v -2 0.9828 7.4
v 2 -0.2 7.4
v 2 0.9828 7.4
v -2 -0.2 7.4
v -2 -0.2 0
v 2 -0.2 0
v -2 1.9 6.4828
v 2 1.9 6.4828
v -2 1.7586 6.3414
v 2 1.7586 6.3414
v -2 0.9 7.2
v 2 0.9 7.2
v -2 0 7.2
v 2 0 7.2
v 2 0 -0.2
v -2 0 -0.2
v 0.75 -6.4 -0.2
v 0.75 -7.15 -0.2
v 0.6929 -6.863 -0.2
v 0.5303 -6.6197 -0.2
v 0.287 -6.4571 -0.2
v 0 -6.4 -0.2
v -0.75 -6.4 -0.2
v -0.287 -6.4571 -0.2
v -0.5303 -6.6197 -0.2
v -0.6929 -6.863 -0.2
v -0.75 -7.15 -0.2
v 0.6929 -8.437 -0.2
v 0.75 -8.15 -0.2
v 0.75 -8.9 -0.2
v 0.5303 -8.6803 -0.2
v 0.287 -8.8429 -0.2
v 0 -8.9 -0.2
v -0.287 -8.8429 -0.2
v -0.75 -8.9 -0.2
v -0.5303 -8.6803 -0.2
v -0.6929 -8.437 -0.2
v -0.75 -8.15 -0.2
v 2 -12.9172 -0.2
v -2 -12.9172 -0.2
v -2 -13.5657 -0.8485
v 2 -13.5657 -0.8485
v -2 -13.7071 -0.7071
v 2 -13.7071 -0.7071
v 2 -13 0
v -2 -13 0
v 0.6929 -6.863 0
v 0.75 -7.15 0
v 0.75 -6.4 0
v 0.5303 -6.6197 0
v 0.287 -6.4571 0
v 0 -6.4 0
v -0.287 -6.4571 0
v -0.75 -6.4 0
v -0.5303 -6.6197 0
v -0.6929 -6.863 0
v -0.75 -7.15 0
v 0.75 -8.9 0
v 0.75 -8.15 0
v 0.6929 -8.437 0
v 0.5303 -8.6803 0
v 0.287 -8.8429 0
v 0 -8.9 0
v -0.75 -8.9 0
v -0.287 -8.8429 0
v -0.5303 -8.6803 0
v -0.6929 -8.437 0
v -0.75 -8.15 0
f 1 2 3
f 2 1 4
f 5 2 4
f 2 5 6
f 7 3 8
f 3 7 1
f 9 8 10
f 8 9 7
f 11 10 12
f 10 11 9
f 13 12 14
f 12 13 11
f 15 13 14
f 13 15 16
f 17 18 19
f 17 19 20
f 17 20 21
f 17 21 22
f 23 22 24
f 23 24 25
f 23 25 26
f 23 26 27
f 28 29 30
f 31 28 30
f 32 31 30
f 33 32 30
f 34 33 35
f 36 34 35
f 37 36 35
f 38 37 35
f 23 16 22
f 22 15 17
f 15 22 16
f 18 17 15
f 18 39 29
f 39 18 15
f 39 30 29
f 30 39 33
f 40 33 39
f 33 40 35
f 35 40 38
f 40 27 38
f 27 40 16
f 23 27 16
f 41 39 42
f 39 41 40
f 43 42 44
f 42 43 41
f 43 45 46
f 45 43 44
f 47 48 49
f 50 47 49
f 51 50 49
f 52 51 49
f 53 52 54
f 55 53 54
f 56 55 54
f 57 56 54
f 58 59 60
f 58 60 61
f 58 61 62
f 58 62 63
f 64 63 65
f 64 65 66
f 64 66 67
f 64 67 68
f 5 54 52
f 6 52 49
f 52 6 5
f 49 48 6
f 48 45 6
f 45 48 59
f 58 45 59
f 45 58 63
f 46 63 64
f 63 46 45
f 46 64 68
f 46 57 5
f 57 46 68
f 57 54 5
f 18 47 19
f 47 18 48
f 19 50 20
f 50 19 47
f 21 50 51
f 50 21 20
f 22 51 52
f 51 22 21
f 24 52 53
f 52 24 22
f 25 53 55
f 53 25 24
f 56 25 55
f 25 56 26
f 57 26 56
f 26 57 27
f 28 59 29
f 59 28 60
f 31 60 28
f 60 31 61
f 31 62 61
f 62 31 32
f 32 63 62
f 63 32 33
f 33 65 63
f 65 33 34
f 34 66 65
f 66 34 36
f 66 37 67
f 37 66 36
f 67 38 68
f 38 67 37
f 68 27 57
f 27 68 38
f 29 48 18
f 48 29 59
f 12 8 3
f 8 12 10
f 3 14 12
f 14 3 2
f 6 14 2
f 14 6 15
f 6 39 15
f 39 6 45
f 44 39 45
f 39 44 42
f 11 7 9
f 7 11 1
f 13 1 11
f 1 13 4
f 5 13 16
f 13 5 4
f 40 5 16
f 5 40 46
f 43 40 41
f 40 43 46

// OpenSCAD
// file: ../p/2-4edge.scad
use <../lib.scad>
function ldraw_lib__2_4edge() = [
// 0 Circle 0.5
// 0 Name: 2-4edge.dat
// 0 Author: James Jessiman
// 0 !LDRAW_ORG Primitive UPDATE 2017-01
// 0 !LICENSE Licensed under CC BY 4.0 : see CAreadme.txt
// 
// 0 BFC CERTIFY CCW
  [0,"BFC","CERTIFY"],
  [0,"BFC","CCW"],
// 
// 0 !HISTORY 2007-06-24 [PTadmin] Header formatted for Contributor Agreement
// 0 !HISTORY 2008-07-01 [PTadmin] Official Update 2008-01
// 0 !HISTORY 2017-01-15 [Steffen] BFCed
// 0 !HISTORY 2017-12-30 [PTadmin] Official Update 2017-01
// 
// 
// 2 24 1 0 0 0.9239 0 0.3827
  [2,24,1,0,0,0.9239,0,0.3827],
// 2 24 0.9239 0 0.3827 0.7071 0 0.7071
  [2,24,0.9239,0,0.3827,0.7071,0,0.7071],
// 2 24 0.7071 0 0.7071 0.3827 0 0.9239
  [2,24,0.7071,0,0.7071,0.3827,0,0.9239],
// 2 24 0.3827 0 0.9239 0 0 1
  [2,24,0.3827,0,0.9239,0,0,1],
// 2 24 0 0 1 -0.3827 0 0.9239
  [2,24,0,0,1,-0.3827,0,0.9239],
// 2 24 -0.3827 0 0.9239 -0.7071 0 0.7071
  [2,24,-0.3827,0,0.9239,-0.7071,0,0.7071],
// 2 24 -0.7071 0 0.7071 -0.9239 0 0.3827
  [2,24,-0.7071,0,0.7071,-0.9239,0,0.3827],
// 2 24 -0.9239 0 0.3827 -1 0 0
  [2,24,-0.9239,0,0.3827,-1,0,0],
];
module ldraw_lib__2_4edge(step=0, col=false, unit=2/5, alt=false, line=0.2, solid=!$preview)
    makepoly(ldraw_lib__2_4edge(), step=step, col=col, unit=unit, alt=alt, line=line, solid=solid);
ldraw_lib__2_4edge(line=0.2);
// file: ../p/2-4cyli.scad
use <../lib.scad>
function ldraw_lib__2_4cyli() = [
// 0 Cylinder 0.5
// 0 Name: 2-4cyli.dat
// 0 Author: James Jessiman
// 0 !LDRAW_ORG Primitive UPDATE 2005-01
// 0 !LICENSE Licensed under CC BY 4.0 : see CAreadme.txt
// 
// 0 BFC CERTIFY CCW
  [0,"BFC","CERTIFY"],
  [0,"BFC","CCW"],
// 
// 0 !HISTORY 2002-03-23 [sbliss] Added BFC statement; compacted code
// 0 !HISTORY 2002-04-25 [PTadmin] Official Update 2002-02
// 0 !HISTORY 2004-12-11 [nielsk] Recreated using Primitive Generator, Edge lines fixed, BFC changed to CCW
// 0 !HISTORY 2005-12-28 [PTadmin] Official Update 2005-01
// 0 !HISTORY 2007-06-24 [PTadmin] Header formatted for Contributor Agreement
// 0 !HISTORY 2008-07-01 [PTadmin] Official Update 2008-01
// 
// 
// 4 16 .9239 1 .3827 .9239 0 .3827 1 0 0 1 1 0
  [4,16,.9239,1,.3827,.9239,0,.3827,1,0,0,1,1,0],
// 4 16 .7071 1 .7071 .7071 0 .7071 .9239 0 .3827 .9239 1 .3827
  [4,16,.7071,1,.7071,.7071,0,.7071,.9239,0,.3827,.9239,1,.3827],
// 4 16 .3827 1 .9239 .3827 0 .9239 .7071 0 .7071 .7071 1 .7071
  [4,16,.3827,1,.9239,.3827,0,.9239,.7071,0,.7071,.7071,1,.7071],
// 4 16 0 1 1 0 0 1 .3827 0 .9239 .3827 1 .9239
  [4,16,0,1,1,0,0,1,.3827,0,.9239,.3827,1,.9239],
// 4 16 -.3827 1 .9239 -.3827 0 .9239 0 0 1 0 1 1
  [4,16,-.3827,1,.9239,-.3827,0,.9239,0,0,1,0,1,1],
// 4 16 -.7071 1 .7071 -.7071 0 .7071 -.3827 0 .9239 -.3827 1 .9239
  [4,16,-.7071,1,.7071,-.7071,0,.7071,-.3827,0,.9239,-.3827,1,.9239],
// 4 16 -.9239 1 .3827 -.9239 0 .3827 -.7071 0 .7071 -.7071 1 .7071
  [4,16,-.9239,1,.3827,-.9239,0,.3827,-.7071,0,.7071,-.7071,1,.7071],
// 4 16 -1 1 0 -1 0 0 -.9239 0 .3827 -.9239 1 .3827
  [4,16,-1,1,0,-1,0,0,-.9239,0,.3827,-.9239,1,.3827],
// 5 24 1 1 0 1 0 0 1 1 -.4142 .9239 1 .3827
  [5,24,1,1,0,1,0,0,1,1,-.4142,.9239,1,.3827],
// 5 24 .9239 1 .3827 .9239 0 .3827 1 1 0 .7071 1 .7071
  [5,24,.9239,1,.3827,.9239,0,.3827,1,1,0,.7071,1,.7071],
// 5 24 .7071 1 .7071 .7071 0 .7071 .9239 1 .3827 .3827 1 .9239
  [5,24,.7071,1,.7071,.7071,0,.7071,.9239,1,.3827,.3827,1,.9239],
// 5 24 .3827 1 .9239 .3827 0 .9239 .7071 1 .7071 0 1 1
  [5,24,.3827,1,.9239,.3827,0,.9239,.7071,1,.7071,0,1,1],
// 5 24 0 1 1 0 0 1 .3827 1 .9239 -.3827 1 .9239
  [5,24,0,1,1,0,0,1,.3827,1,.9239,-.3827,1,.9239],
// 5 24 -.3827 1 .9239 -.3827 0 .9239 0 1 1 -.7071 1 .7071
  [5,24,-.3827,1,.9239,-.3827,0,.9239,0,1,1,-.7071,1,.7071],
// 5 24 -.7071 1 .7071 -.7071 0 .7071 -.3827 1 .9239 -.9239 1 .3827
  [5,24,-.7071,1,.7071,-.7071,0,.7071,-.3827,1,.9239,-.9239,1,.3827],
// 5 24 -.9239 1 .3827 -.9239 0 .3827 -.7071 1 .7071 -1 1 0
  [5,24,-.9239,1,.3827,-.9239,0,.3827,-.7071,1,.7071,-1,1,0],
// 5 24 -1 1 0 -1 0 0 -.9239 1 .3827 -1 1 -.4142
  [5,24,-1,1,0,-1,0,0,-.9239,1,.3827,-1,1,-.4142],
// 0
];
module ldraw_lib__2_4cyli(step=0, col=false, unit=2/5, alt=false, line=0.2, solid=!$preview)
    makepoly(ldraw_lib__2_4cyli(), step=step, col=col, unit=unit, alt=alt, line=line, solid=solid);
ldraw_lib__2_4cyli(line=0.2);
// file: ../p/recte3.scad
use <../lib.scad>
function ldraw_lib__recte3() = [
// 0 Rectangle Empty with 3 Edges
// 0 Name: recte3.dat
// 0 Author: Steffen [Steffen]
// 0 !LDRAW_ORG Primitive UPDATE 2011-01
// 0 !LICENSE Licensed under CC BY 4.0 : see CAreadme.txt
// 
// 0 BFC CERTIFY CCW
  [0,"BFC","CERTIFY"],
  [0,"BFC","CCW"],
// 
// 0 !HISTORY 2011-07-25 [PTadmin] Official Update 2011-01
// 
// 
// 2 24 1 0 1 -1 0 1
  [2,24,1,0,1,-1,0,1],
// 2 24 -1 0 1 -1 0 -1
  [2,24,-1,0,1,-1,0,-1],
// 2 24 1 0 -1 1 0 1
  [2,24,1,0,-1,1,0,1],
];
module ldraw_lib__recte3(step=0, col=false, unit=2/5, alt=false, line=0.2, solid=!$preview)
    makepoly(ldraw_lib__recte3(), step=step, col=col, unit=unit, alt=alt, line=line, solid=solid);
ldraw_lib__recte3(line=0.2);
// file: ../p/rect3.scad
use <../lib.scad>
function ldraw_lib__rect3() = [
// 0 Rectangle with 3 Edges
// 0 Name: rect3.dat
// 0 Author: Mark Kennedy [mkennedy]
// 0 !LDRAW_ORG Primitive UPDATE 2010-01
// 0 !LICENSE Licensed under CC BY 4.0 : see CAreadme.txt
// 
// 0 BFC CERTIFY CCW
  [0,"BFC","CERTIFY"],
  [0,"BFC","CCW"],
// 
// 0 !HISTORY 2003-08-01 [PTadmin] Official Update 2003-02
// 0 !HISTORY 2007-06-24 [PTadmin] Header formatted for Contributor Agreement
// 0 !HISTORY 2008-07-01 [PTadmin] Official Update 2008-01
// 0 !HISTORY 2010-01-17 [mikeheide] Change winding to CCW
// 0 !HISTORY 2010-04-05 [PTadmin] Official Update 2010-01
// 
// 
// 2 24 1 0 1 -1 0 1
  [2,24,1,0,1,-1,0,1],
// 2 24 1 0 1 1 0 -1
  [2,24,1,0,1,1,0,-1],
// 2 24 -1 0 1 -1 0 -1
  [2,24,-1,0,1,-1,0,-1],
// 4 16 -1 0 1 -1 0 -1 1 0 -1 1 0 1
  [4,16,-1,0,1,-1,0,-1,1,0,-1,1,0,1],
// 0 //
];
module ldraw_lib__rect3(step=0, col=false, unit=2/5, alt=false, line=0.2, solid=!$preview)
    makepoly(ldraw_lib__rect3(), step=step, col=col, unit=unit, alt=alt, line=line, solid=solid);
ldraw_lib__rect3(line=0.2);
// file: ../p/rect2p.scad
use <../lib.scad>
function ldraw_lib__rect2p() = [
// 0 Rectangle with 2 Parallel Edges
// 0 Name: rect2p.dat
// 0 Author: Donald Sutter [technog]
// 0 !LDRAW_ORG Primitive UPDATE 2010-01
// 0 !LICENSE Licensed under CC BY 4.0 : see CAreadme.txt
// 
// 0 BFC CERTIFY CCW
  [0,"BFC","CERTIFY"],
  [0,"BFC","CCW"],
// 
// 0 !HISTORY 2003-08-01 [PTadmin] Official Update 2003-02
// 0 !HISTORY 2007-06-24 [PTadmin] Header formatted for Contributor Agreement
// 0 !HISTORY 2008-07-01 [PTadmin] Official Update 2008-01
// 0 !HISTORY 2010-01-17 [mikeheide] changed winding to CCW
// 0 !HISTORY 2010-04-05 [PTadmin] Official Update 2010-01
// 
// 
// 2 24 1 0 1 -1 0 1
  [2,24,1,0,1,-1,0,1],
// 2 24 -1 0 -1 1 0 -1
  [2,24,-1,0,-1,1,0,-1],
// 4 16 -1 0 1 -1 0 -1 1 0 -1 1 0 1
  [4,16,-1,0,1,-1,0,-1,1,0,-1,1,0,1],
// 0
];
module ldraw_lib__rect2p(step=0, col=false, unit=2/5, alt=false, line=0.2, solid=!$preview)
    makepoly(ldraw_lib__rect2p(), step=step, col=col, unit=unit, alt=alt, line=line, solid=solid);
ldraw_lib__rect2p(line=0.2);
// file: ../p/box2-5.scad
use <../lib.scad>
function ldraw_lib__box2_5() = [
// 0 Box with 2 Faces without 5 Edges
// 0 Name: box2-5.dat
// 0 Author: Steffen [Steffen]
// 0 !LDRAW_ORG Primitive UPDATE 2003-03
// 0 !LICENSE Licensed under CC BY 4.0 : see CAreadme.txt
// 
// 0 BFC CERTIFY CCW
  [0,"BFC","CERTIFY"],
  [0,"BFC","CCW"],
// 
// 0 !HISTORY 2003-12-19 [PTadmin] Official Update 2003-03
// 0 !HISTORY 2007-06-24 [PTadmin] Header formatted for Contributor Agreement
// 0 !HISTORY 2008-07-01 [PTadmin] Official Update 2008-01
// 
// 
// 2 24 1 1 1 -1 1 1
  [2,24,1,1,1,-1,1,1],
// 2 24 1 1 -1 -1 1 -1
  [2,24,1,1,-1,-1,1,-1],
// 2 24 1 -1 1 -1 -1 1
  [2,24,1,-1,1,-1,-1,1],
// 2 24 -1 -1 1 -1 1 1
  [2,24,-1,-1,1,-1,1,1],
// 2 24 1 -1 1 1 1 1
  [2,24,1,-1,1,1,1,1],
// 2 24 -1 1 -1 -1 1 1
  [2,24,-1,1,-1,-1,1,1],
// 2 24 1 1 -1 1 1 1
  [2,24,1,1,-1,1,1,1],
// 4 16 1 1 1 1 1 -1 -1 1 -1 -1 1 1
  [4,16,1,1,1,1,1,-1,-1,1,-1,-1,1,1],
// 4 16 1 1 1 -1 1 1 -1 -1 1 1 -1 1
  [4,16,1,1,1,-1,1,1,-1,-1,1,1,-1,1],
// 0
];
module ldraw_lib__box2_5(step=0, col=false, unit=2/5, alt=false, line=0.2, solid=!$preview)
    makepoly(ldraw_lib__box2_5(), step=step, col=col, unit=unit, alt=alt, line=line, solid=solid);
ldraw_lib__box2_5(line=0.2);
// file: ../p/2-4ndis.scad
use <../lib.scad>
function ldraw_lib__2_4ndis() = [
// 0 Disc Negative 0.5
// 0 Name: 2-4ndis.dat
// 0 Author: James Jessiman
// 0 !LDRAW_ORG Primitive UPDATE 2012-01
// 0 !LICENSE Licensed under CC BY 4.0 : see CAreadme.txt
// 
// 0 BFC CERTIFY CCW
  [0,"BFC","CERTIFY"],
  [0,"BFC","CCW"],
// 
// 0 !HISTORY 2002-03-23 [sbliss] Added BFC statement; compacted code
// 0 !HISTORY 2002-04-25 [PTadmin] Official Update 2002-02
// 0 !HISTORY 2007-06-24 [PTadmin] Header formatted for Contributor Agreement
// 0 !HISTORY 2008-07-01 [PTadmin] Official Update 2008-01
// 0 !HISTORY 2012-02-16 [Philo] Changed to CCW
// 0 !HISTORY 2012-03-30 [PTadmin] Official Update 2012-01
// 
// 
// 3 16 0.9239 0 0.3827 1 0 0 1 0 1
  [3,16,0.9239,0,0.3827,1,0,0,1,0,1],
// 3 16 0.7071 0 0.7071 0.9239 0 0.3827 1 0 1
  [3,16,0.7071,0,0.7071,0.9239,0,0.3827,1,0,1],
// 3 16 0.3827 0 0.9239 0.7071 0 0.7071 1 0 1
  [3,16,0.3827,0,0.9239,0.7071,0,0.7071,1,0,1],
// 3 16 0 0 1 0.3827 0 0.9239 1 0 1
  [3,16,0,0,1,0.3827,0,0.9239,1,0,1],
// 3 16 -0.3827 0 0.9239 0 0 1 -1 0 1
  [3,16,-0.3827,0,0.9239,0,0,1,-1,0,1],
// 3 16 -0.7071 0 0.7071 -0.3827 0 0.9239 -1 0 1
  [3,16,-0.7071,0,0.7071,-0.3827,0,0.9239,-1,0,1],
// 3 16 -0.9239 0 0.3827 -0.7071 0 0.7071 -1 0 1
  [3,16,-0.9239,0,0.3827,-0.7071,0,0.7071,-1,0,1],
// 3 16 -1 0 0 -0.9239 0 0.3827 -1 0 1
  [3,16,-1,0,0,-0.9239,0,0.3827,-1,0,1],
];
module ldraw_lib__2_4ndis(step=0, col=false, unit=2/5, alt=false, line=0.2, solid=!$preview)
    makepoly(ldraw_lib__2_4ndis(), step=step, col=col, unit=unit, alt=alt, line=line, solid=solid);
ldraw_lib__2_4ndis(line=0.2);
// file: ../p/2-4cylo.scad
use <../lib.scad>
use <2-4cyli.scad>
use <2-4edge.scad>
function ldraw_lib__2_4cylo() = [
// 0 Cylinder Open 0.5
// 0 Name: 2-4cylo.dat
// 0 Author: Max Martin Richter [MMR1988]
// 0 !LDRAW_ORG Primitive UPDATE 2010-03
// 0 !LICENSE Licensed under CC BY 4.0 : see CAreadme.txt
// 
// 0 BFC CERTIFY CCW
  [0,"BFC","CERTIFY"],
  [0,"BFC","CCW"],
// 
// 0 !HISTORY 2010-12-31 [PTadmin] Official Update 2010-03
// 
// 
// 1 16 0 0 0 1 0 0 0 1 0 0 0 1 2-4edge.dat
  [1,16,0,0,0,1,0,0,0,1,0,0,0,1, ldraw_lib__2_4edge()],
// 1 16 0 1 0 1 0 0 0 1 0 0 0 1 2-4edge.dat
  [1,16,0,1,0,1,0,0,0,1,0,0,0,1, ldraw_lib__2_4edge()],
// 1 16 0 0 0 1 0 0 0 1 0 0 0 1 2-4cyli.dat
  [1,16,0,0,0,1,0,0,0,1,0,0,0,1, ldraw_lib__2_4cyli()],
];
module ldraw_lib__2_4cylo(step=0, col=false, unit=2/5, alt=false, line=0.2, solid=!$preview)
    makepoly(ldraw_lib__2_4cylo(), step=step, col=col, unit=unit, alt=alt, line=line, solid=solid);
ldraw_lib__2_4cylo(line=0.2);
// main file
use <../lib.scad>
use <../p/2-4cylo.scad>
use <../p/2-4ndis.scad>
use <../p/box2-5.scad>
use <../p/rect2p.scad>
use <../p/rect3.scad>
use <../p/recte3.scad>
function ldraw_lib__u9173() = [
// 0 ~Train Track  9V Switch - Internal Contact Plate for Switch Function
// 0 Name: u9173.dat
// 0 Author: Max Martin Richter [MMR1988]
// 0 !LDRAW_ORG Part UPDATE 2025-08
// 0 !LICENSE Licensed under CC BY 4.0 : see CAreadme.txt
// 
// 0 BFC CERTIFY CCW
  [0,"BFC","CERTIFY"],
  [0,"BFC","CCW"],
// 
// 0 !HISTORY 2025-08-31 [OrionP] Official Update 2025-08
// 
// 1 16 0 -9.25 .978553 5 0 0 0 -9.25 0 0 0 -1.478553 box2-5.dat
  [1,16,0,-9.25,.978553,5,0,0,0,-9.25,0,0,0,-1.478553, ldraw_lib__box2_5()],
// 4 16 5 -16.207107 4.75 -5 -16.207107 4.75 -5 -18.5 2.457106 5 -18.5 2.457106
  [4,16,5,-16.207107,4.75,-5,-16.207107,4.75,-5,-18.5,2.457106,5,-18.5,2.457106],
// 2 24 -5 -16.207107 4.75 -5 -18.5 2.457106
  [2,24,-5,-16.207107,4.75,-5,-18.5,2.457106],
// 2 24 5 -16.207107 4.75 5 -18.5 2.457106
  [2,24,5,-16.207107,4.75,5,-18.5,2.457106],
// 2 24 -5 -16.207107 4.75 5 -16.207107 4.75
  [2,24,-5,-16.207107,4.75,5,-16.207107,4.75],
// 4 16 -5 -16.207107 4.75 5 -16.207107 4.75 5 -15.853554 4.396446 -5 -15.853554 4.396446
  [4,16,-5,-16.207107,4.75,5,-16.207107,4.75,5,-15.853554,4.396446,-5,-15.853554,4.396446],
// 2 24 -5 -15.853554 4.396446 -5 -16.207107 4.75
  [2,24,-5,-15.853554,4.396446,-5,-16.207107,4.75],
// 2 24 5 -15.853554 4.396446 5 -16.207107 4.75
  [2,24,5,-15.853554,4.396446,5,-16.207107,4.75],
// 1 16 0 -16.926777 3.323223 5 0 0 0 -1.073223 1.073223 0 0 1.073223 rect3.dat
  [1,16,0,-16.926777,3.323223,5,0,0,0,-1.073223,1.073223,0,0,1.073223, ldraw_lib__rect3()],
// 0 BFC INVERTNEXT
  [0,"BFC","INVERTNEXT"],
// 1 16 0 -8.75 1.125 5 0 0 0 -9.25 0 0 0 -1.125 box2-5.dat
  [1,16,0,-8.75,1.125,5,0,0,0,-9.25,0,0,0,-1.125, ldraw_lib__box2_5()],
// 1 16 0 .5 -17.875 1.875 0 0 0 -1 0 0 0 1.875 2-4ndis.dat
  [1,16,0,.5,-17.875,1.875,0,0,0,-1,0,0,0,1.875, ldraw_lib__2_4ndis()],
// 1 16 0 .5 -20.375 1.875 0 0 0 -1 0 0 0 -1.875 2-4ndis.dat
  [1,16,0,.5,-20.375,1.875,0,0,0,-1,0,0,0,-1.875, ldraw_lib__2_4ndis()],
// 3 16 -1.875 .5 -16 -5 .5 0 0 .5 -16
  [3,16,-1.875,.5,-16,-5,.5,0,0,.5,-16],
// 4 16 1.875 .5 -16 0 .5 -16 -5 .5 0 5 .5 0
  [4,16,1.875,.5,-16,0,.5,-16,-5,.5,0,5,.5,0],
// 3 16 1.875 .5 -17.875 1.875 .5 -16 5 .5 0
  [3,16,1.875,.5,-17.875,1.875,.5,-16,5,.5,0],
// 4 16 1.875 .5 -20.375 1.875 .5 -17.875 5 .5 0 5 .5 -32.292893
  [4,16,1.875,.5,-20.375,1.875,.5,-17.875,5,.5,0,5,.5,-32.292893],
// 3 16 5 .5 -32.292893 1.875 .5 -22.25 1.875 .5 -20.375
  [3,16,5,.5,-32.292893,1.875,.5,-22.25,1.875,.5,-20.375],
// 3 16 1.875 .5 -22.25 5 .5 -32.292893 0 .5 -22.25
  [3,16,1.875,.5,-22.25,5,.5,-32.292893,0,.5,-22.25],
// 4 16 -1.875 .5 -22.25 0 .5 -22.25 5 .5 -32.292893 -5 .5 -32.292893
  [4,16,-1.875,.5,-22.25,0,.5,-22.25,5,.5,-32.292893,-5,.5,-32.292893],
// 3 16 -1.875 .5 -22.25 -5 .5 -32.292893 -1.875 .5 -20.375
  [3,16,-1.875,.5,-22.25,-5,.5,-32.292893,-1.875,.5,-20.375],
// 4 16 -1.875 .5 -17.875 -1.875 .5 -20.375 -5 .5 -32.292893 -5 .5 0
  [4,16,-1.875,.5,-17.875,-1.875,.5,-20.375,-5,.5,-32.292893,-5,.5,0],
// 3 16 -1.875 .5 -16 -1.875 .5 -17.875 -5 .5 0
  [3,16,-1.875,.5,-16,-1.875,.5,-17.875,-5,.5,0],
// 2 24 -5 .5 -32.292893 -5 .5 0
  [2,24,-5,.5,-32.292893,-5,.5,0],
// 2 24 5 .5 -32.292893 5 .5 0
  [2,24,5,.5,-32.292893,5,.5,0],
// 2 24 5 .5 -32.292893 -5 .5 -32.292893
  [2,24,5,.5,-32.292893,-5,.5,-32.292893],
// 4 16 5 .5 -32.292893 5 2.12132 -33.914214 -5 2.12132 -33.914214 -5 .5 -32.292893
  [4,16,5,.5,-32.292893,5,2.12132,-33.914214,-5,2.12132,-33.914214,-5,.5,-32.292893],
// 2 24 -5 .5 -32.292893 -5 2.12132 -33.914214
  [2,24,-5,.5,-32.292893,-5,2.12132,-33.914214],
// 2 24 5 .5 -32.292893 5 2.12132 -33.914214
  [2,24,5,.5,-32.292893,5,2.12132,-33.914214],
// 2 24 5 2.12132 -33.914214 -5 2.12132 -33.914214
  [2,24,5,2.12132,-33.914214,-5,2.12132,-33.914214],
// 4 16 -5 2.12132 -33.914214 5 2.12132 -33.914214 5 1.767767 -34.267767 -5 1.767767 -34.267767
  [4,16,-5,2.12132,-33.914214,5,2.12132,-33.914214,5,1.767767,-34.267767,-5,1.767767,-34.267767],
// 2 24 -5 1.767767 -34.267767 -5 2.12132 -33.914214
  [2,24,-5,1.767767,-34.267767,-5,2.12132,-33.914214],
// 2 24 5 1.767767 -34.267767 5 2.12132 -33.914214
  [2,24,5,1.767767,-34.267767,5,2.12132,-33.914214],
// 2 24 -5 1.767767 -34.267767 5 1.767767 -34.267767
  [2,24,-5,1.767767,-34.267767,5,1.767767,-34.267767],
// 4 16 5 0 -32.5 -5 0 -32.5 -5 1.767767 -34.267767 5 1.767767 -34.267767
  [4,16,5,0,-32.5,-5,0,-32.5,-5,1.767767,-34.267767,5,1.767767,-34.267767],
// 2 24 -5 0 -32.5 -5 1.767767 -34.267767
  [2,24,-5,0,-32.5,-5,1.767767,-34.267767],
// 2 24 5 0 -32.5 5 1.767767 -34.267767
  [2,24,5,0,-32.5,5,1.767767,-34.267767],
// 1 16 0 0 -17.875 1.875 0 0 0 1 0 0 0 1.875 2-4ndis.dat
  [1,16,0,0,-17.875,1.875,0,0,0,1,0,0,0,1.875, ldraw_lib__2_4ndis()],
// 1 16 0 0 -20.375 1.875 0 0 0 1 0 0 0 -1.875 2-4ndis.dat
  [1,16,0,0,-20.375,1.875,0,0,0,1,0,0,0,-1.875, ldraw_lib__2_4ndis()],
// 3 16 -5 0 -.5 -1.875 0 -16 0 0 -16
  [3,16,-5,0,-.5,-1.875,0,-16,0,0,-16],
// 4 16 -5 0 -.5 0 0 -16 1.875 0 -16 5 0 -.5
  [4,16,-5,0,-.5,0,0,-16,1.875,0,-16,5,0,-.5],
// 3 16 1.875 0 -16 1.875 0 -17.875 5 0 -.5
  [3,16,1.875,0,-16,1.875,0,-17.875,5,0,-.5],
// 4 16 5 0 -.5 1.875 0 -17.875 1.875 0 -20.375 5 0 -32.5
  [4,16,5,0,-.5,1.875,0,-17.875,1.875,0,-20.375,5,0,-32.5],
// 3 16 1.875 0 -22.25 5 0 -32.5 1.875 0 -20.375
  [3,16,1.875,0,-22.25,5,0,-32.5,1.875,0,-20.375],
// 3 16 5 0 -32.5 1.875 0 -22.25 0 0 -22.25
  [3,16,5,0,-32.5,1.875,0,-22.25,0,0,-22.25],
// 4 16 5 0 -32.5 0 0 -22.25 -1.875 0 -22.25 -5 0 -32.5
  [4,16,5,0,-32.5,0,0,-22.25,-1.875,0,-22.25,-5,0,-32.5],
// 3 16 -5 0 -32.5 -1.875 0 -22.25 -1.875 0 -20.375
  [3,16,-5,0,-32.5,-1.875,0,-22.25,-1.875,0,-20.375],
// 4 16 -5 0 -32.5 -1.875 0 -20.375 -1.875 0 -17.875 -5 0 -.5
  [4,16,-5,0,-32.5,-1.875,0,-20.375,-1.875,0,-17.875,-5,0,-.5],
// 3 16 -1.875 0 -17.875 -1.875 0 -16 -5 0 -.5
  [3,16,-1.875,0,-17.875,-1.875,0,-16,-5,0,-.5],
// 1 16 0 0 -16.5 5 0 0 0 1 0 0 0 -16 recte3.dat
  [1,16,0,0,-16.5,5,0,0,0,1,0,0,0,-16, ldraw_lib__recte3()],
// 
// 0 BFC INVERTNEXT
  [0,"BFC","INVERTNEXT"],
// 1 16 0 0 -17.875 1.875 0 0 0 .5 0 0 0 1.875 2-4cylo.dat
  [1,16,0,0,-17.875,1.875,0,0,0,.5,0,0,0,1.875, ldraw_lib__2_4cylo()],
// 0 BFC INVERTNEXT
  [0,"BFC","INVERTNEXT"],
// 1 16 0 0 -20.375 1.875 0 0 0 .5 0 0 0 -1.875 2-4cylo.dat
  [1,16,0,0,-20.375,1.875,0,0,0,.5,0,0,0,-1.875, ldraw_lib__2_4cylo()],
// 1 16 -1.875 .25 -19.125 0 -1 0 0 0 .25 -1.25 0 0 rect2p.dat
  [1,16,-1.875,.25,-19.125,0,-1,0,0,0,.25,-1.25,0,0, ldraw_lib__rect2p()],
// 1 16 1.875 .25 -19.125 0 1 0 0 0 .25 -1.25 0 0 rect2p.dat
  [1,16,1.875,.25,-19.125,0,1,0,0,0,.25,-1.25,0,0, ldraw_lib__rect2p()],
// 
// 4 16 5 -15.853554 4.396446 5 -16.207107 4.75 5 -18.5 2.457106 5 -18 2.25
  [4,16,5,-15.853554,4.396446,5,-16.207107,4.75,5,-18.5,2.457106,5,-18,2.25],
// 4 16 5 -18 0 5 -18 2.25 5 -18.5 2.457106 5 -18.5 -.5
  [4,16,5,-18,0,5,-18,2.25,5,-18.5,2.457106,5,-18.5,-.5],
// 4 16 5 .5 0 5 -18 0 5 -18.5 -.5 5 0 -.5
  [4,16,5,.5,0,5,-18,0,5,-18.5,-.5,5,0,-.5],
// 4 16 5 .5 -32.292893 5 .5 0 5 0 -.5 5 0 -32.5
  [4,16,5,.5,-32.292893,5,.5,0,5,0,-.5,5,0,-32.5],
// 4 16 5 2.12132 -33.914214 5 .5 -32.292893 5 0 -32.5 5 1.767767 -34.267767
  [4,16,5,2.12132,-33.914214,5,.5,-32.292893,5,0,-32.5,5,1.767767,-34.267767],
// 
// 4 16 -5 -18.5 2.457106 -5 -16.207107 4.75 -5 -15.853554 4.396446 -5 -18 2.25
  [4,16,-5,-18.5,2.457106,-5,-16.207107,4.75,-5,-15.853554,4.396446,-5,-18,2.25],
// 4 16 -5 -18.5 2.457106 -5 -18 2.25 -5 -18 0 -5 -18.5 -.5
  [4,16,-5,-18.5,2.457106,-5,-18,2.25,-5,-18,0,-5,-18.5,-.5],
// 4 16 -5 -18.5 -.5 -5 -18 0 -5 .5 0 -5 0 -.5
  [4,16,-5,-18.5,-.5,-5,-18,0,-5,.5,0,-5,0,-.5],
// 4 16 -5 0 -.5 -5 .5 0 -5 .5 -32.292893 -5 0 -32.5
  [4,16,-5,0,-.5,-5,.5,0,-5,.5,-32.292893,-5,0,-32.5],
// 4 16 -5 0 -32.5 -5 .5 -32.292893 -5 2.12132 -33.914214 -5 1.767767 -34.267767
  [4,16,-5,0,-32.5,-5,.5,-32.292893,-5,2.12132,-33.914214,-5,1.767767,-34.267767],
];
module ldraw_lib__u9173(step=0, col=false, unit=2/5, alt=false, line=0.2, solid=!$preview)
    makepoly(ldraw_lib__u9173(), step=step, col=col, unit=unit, alt=alt, line=line, solid=solid);
ldraw_lib__u9173(line=0.2);
